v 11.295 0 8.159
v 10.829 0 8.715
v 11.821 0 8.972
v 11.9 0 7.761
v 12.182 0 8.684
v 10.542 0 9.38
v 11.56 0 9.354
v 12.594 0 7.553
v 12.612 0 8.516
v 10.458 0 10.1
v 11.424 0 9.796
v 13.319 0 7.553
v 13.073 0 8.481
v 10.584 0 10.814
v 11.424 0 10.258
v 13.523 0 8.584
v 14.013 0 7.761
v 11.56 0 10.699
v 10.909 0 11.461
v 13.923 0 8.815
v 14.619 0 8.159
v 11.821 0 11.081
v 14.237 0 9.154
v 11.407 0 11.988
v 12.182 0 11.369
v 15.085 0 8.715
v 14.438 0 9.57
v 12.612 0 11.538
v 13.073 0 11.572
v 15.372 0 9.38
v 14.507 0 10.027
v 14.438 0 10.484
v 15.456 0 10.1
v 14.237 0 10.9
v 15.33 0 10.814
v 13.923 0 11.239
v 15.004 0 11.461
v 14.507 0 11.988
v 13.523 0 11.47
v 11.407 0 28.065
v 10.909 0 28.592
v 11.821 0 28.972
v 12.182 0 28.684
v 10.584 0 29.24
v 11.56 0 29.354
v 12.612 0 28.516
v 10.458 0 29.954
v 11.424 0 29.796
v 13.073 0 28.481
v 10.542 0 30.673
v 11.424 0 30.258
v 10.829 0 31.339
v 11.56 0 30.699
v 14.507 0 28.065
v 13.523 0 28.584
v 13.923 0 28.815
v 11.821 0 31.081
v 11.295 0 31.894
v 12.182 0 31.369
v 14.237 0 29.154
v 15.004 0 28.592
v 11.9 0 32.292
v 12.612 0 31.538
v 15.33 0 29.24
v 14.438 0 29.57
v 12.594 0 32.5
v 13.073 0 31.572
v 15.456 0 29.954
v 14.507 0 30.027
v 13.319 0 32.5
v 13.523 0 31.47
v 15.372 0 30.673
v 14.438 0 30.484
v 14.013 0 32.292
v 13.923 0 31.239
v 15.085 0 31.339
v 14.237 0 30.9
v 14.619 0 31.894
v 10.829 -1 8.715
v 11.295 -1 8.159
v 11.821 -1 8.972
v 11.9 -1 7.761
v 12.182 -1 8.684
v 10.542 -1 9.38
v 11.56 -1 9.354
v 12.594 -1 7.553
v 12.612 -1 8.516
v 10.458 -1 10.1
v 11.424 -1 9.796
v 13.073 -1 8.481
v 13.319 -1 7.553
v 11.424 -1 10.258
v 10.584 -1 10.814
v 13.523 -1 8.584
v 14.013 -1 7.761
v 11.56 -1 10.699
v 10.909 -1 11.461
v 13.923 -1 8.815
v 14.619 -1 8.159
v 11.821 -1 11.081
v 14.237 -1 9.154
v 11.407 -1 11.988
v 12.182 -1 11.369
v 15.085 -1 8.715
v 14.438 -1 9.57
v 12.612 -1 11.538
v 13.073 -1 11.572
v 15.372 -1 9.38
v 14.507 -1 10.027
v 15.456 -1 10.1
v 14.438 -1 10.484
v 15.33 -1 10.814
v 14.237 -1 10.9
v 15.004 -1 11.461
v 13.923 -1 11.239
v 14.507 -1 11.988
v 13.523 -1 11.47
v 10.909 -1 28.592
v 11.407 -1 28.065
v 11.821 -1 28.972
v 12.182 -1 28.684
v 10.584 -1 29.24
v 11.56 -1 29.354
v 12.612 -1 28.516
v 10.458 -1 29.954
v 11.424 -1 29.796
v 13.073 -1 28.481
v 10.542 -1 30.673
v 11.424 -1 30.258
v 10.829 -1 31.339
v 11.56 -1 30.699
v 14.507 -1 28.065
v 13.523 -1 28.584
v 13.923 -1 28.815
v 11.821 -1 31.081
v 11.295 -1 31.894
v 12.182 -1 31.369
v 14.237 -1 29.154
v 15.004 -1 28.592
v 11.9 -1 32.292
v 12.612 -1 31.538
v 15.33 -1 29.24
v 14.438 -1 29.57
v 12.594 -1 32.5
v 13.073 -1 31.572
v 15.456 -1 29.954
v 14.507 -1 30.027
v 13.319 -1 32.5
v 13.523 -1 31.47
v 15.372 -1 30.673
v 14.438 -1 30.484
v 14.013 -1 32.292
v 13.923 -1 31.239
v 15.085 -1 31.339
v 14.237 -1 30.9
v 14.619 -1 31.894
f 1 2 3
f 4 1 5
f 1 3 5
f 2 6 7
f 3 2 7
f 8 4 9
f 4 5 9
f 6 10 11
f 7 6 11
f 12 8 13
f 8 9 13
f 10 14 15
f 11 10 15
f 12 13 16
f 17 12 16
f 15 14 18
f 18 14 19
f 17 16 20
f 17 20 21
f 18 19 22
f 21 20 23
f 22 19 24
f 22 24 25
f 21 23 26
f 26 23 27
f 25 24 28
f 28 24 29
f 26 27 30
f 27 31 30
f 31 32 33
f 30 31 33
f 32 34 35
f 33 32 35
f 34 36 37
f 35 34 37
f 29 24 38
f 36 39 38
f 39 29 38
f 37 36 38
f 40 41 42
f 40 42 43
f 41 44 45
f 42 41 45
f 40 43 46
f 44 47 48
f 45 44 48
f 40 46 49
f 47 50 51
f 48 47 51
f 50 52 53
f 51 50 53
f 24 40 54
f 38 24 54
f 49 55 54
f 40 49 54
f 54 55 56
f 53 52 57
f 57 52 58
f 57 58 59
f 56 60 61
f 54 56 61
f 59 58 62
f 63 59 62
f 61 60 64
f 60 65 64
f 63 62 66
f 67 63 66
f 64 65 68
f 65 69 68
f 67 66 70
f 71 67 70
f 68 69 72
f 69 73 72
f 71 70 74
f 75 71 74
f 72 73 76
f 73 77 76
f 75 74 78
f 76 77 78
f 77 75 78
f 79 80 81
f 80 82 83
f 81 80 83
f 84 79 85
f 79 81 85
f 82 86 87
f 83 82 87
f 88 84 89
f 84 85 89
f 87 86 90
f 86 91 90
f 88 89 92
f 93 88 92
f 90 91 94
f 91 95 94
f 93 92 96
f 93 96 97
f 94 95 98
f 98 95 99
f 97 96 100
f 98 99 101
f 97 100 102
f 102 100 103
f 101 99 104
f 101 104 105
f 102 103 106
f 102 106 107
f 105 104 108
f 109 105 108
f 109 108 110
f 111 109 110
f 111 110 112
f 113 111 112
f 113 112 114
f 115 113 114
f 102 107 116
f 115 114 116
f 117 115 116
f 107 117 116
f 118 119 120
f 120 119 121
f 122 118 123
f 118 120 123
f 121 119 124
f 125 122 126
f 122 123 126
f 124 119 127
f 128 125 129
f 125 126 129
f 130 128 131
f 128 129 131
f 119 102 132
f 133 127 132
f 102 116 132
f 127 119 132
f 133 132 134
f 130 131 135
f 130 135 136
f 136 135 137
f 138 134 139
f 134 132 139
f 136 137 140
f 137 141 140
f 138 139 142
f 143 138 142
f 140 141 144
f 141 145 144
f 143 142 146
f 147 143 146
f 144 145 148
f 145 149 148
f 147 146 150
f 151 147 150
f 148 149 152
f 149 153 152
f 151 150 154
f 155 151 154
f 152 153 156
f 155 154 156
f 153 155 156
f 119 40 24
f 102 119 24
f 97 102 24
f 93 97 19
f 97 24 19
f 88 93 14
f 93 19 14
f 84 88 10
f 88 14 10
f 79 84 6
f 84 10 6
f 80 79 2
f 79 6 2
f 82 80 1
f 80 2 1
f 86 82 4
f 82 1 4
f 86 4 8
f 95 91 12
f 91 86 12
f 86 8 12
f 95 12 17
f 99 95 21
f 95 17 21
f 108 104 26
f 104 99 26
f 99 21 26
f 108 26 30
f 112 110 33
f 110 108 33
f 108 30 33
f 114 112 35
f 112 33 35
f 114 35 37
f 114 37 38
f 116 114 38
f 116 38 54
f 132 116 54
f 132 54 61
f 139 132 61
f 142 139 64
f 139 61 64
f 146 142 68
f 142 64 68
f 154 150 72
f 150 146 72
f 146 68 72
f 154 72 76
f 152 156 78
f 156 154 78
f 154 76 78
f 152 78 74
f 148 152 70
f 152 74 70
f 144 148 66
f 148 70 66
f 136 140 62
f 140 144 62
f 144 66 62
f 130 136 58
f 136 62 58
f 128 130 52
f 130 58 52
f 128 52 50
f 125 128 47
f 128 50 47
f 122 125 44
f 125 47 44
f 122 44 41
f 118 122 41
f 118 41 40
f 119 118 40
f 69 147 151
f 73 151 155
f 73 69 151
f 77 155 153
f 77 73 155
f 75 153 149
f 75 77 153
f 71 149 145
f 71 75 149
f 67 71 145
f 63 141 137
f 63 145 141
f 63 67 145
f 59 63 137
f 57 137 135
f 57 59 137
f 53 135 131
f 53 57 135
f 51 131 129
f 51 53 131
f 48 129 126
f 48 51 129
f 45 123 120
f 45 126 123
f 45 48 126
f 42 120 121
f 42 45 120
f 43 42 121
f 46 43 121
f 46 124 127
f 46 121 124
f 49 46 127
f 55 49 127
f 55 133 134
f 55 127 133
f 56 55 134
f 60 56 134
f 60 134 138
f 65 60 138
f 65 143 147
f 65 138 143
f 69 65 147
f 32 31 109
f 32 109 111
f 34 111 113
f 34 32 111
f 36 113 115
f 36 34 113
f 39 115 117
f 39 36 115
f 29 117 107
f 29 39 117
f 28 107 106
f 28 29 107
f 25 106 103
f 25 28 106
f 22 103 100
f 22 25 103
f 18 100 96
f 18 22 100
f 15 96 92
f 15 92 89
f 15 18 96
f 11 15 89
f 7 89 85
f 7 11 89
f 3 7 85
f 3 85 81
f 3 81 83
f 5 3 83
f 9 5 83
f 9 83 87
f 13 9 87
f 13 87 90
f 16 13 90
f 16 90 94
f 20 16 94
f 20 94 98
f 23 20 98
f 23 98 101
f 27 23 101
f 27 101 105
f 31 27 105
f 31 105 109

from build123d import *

# Parameters (mm, degrees)
F0_R          = 1.55
F1_DEPTH      = 4.5
F2_W          = 2.5
F2_H          = 6.339147
F3_DEPTH      = 4.051
F3_DEPTH_BACK = 0.951
F4_W          = 15.761445
F4_H          = 34.727139
F4_R          = 1.55
F5_DEPTH      = 3.5


with BuildPart() as f1:
    # F0 (on Front) → F1 (new body)
    with BuildSketch(Plane.XZ):
        with BuildLine():
            Line((14.506739, 11.988214), (14.506739, 28.065205))
            ThreePointArc((14.506739, 28.065205), (12.956739, 32.52671), (11.406739, 28.065205))
            Line((11.406739, 28.065205), (11.406739, 11.988214))
            ThreePointArc((11.406739, 11.988214), (12.956739, 7.52671), (14.506739, 11.988214))
        make_face()
        with Locations((12.956739, 10.02671)):
            Circle(F0_R, mode=Mode.SUBTRACT)
        with Locations((12.956739, 30.02671)):
            Circle(F0_R, mode=Mode.SUBTRACT)
    extrude(amount=F1_DEPTH)

    # F2 (on face) → F3 (cut, two sides)
    with BuildSketch(Plane.YZ.offset(14.506739)) as f3_sk:
        with Locations((-2.25, 30.034779)):
            Rectangle(F2_W, F2_H)
    extrude(amount=-F3_DEPTH, mode=Mode.SUBTRACT)
    extrude(f3_sk.sketch, amount=-F3_DEPTH_BACK, mode=Mode.SUBTRACT)

    # F4 (on face) → F5 (cut)
    with BuildSketch(Plane.XZ.offset(4.5)):
        with Locations((14.291149, 18.705026)):
            Rectangle(F4_W, F4_H)
        with BuildLine():
            ThreePointArc((14.506739, 11.988214), (12.956739, 7.52671), (11.406739, 11.988214))
            Line((11.406739, 11.988214), (11.406739, 28.065205))
            ThreePointArc((11.406739, 28.065205), (12.956739, 32.52671), (14.506739, 28.065205))
            Line((14.506739, 28.065205), (14.506739, 11.988214))
        make_face(mode=Mode.SUBTRACT)
        with BuildLine():
            Line((11.406739, 28.065205), (11.406739, 11.988214))
            ThreePointArc((11.406739, 11.988214), (12.956739, 7.52671), (14.506739, 11.988214))
            Line((14.506739, 11.988214), (14.506739, 28.065205))
            ThreePointArc((14.506739, 28.065205), (12.956739, 32.52671), (11.406739, 28.065205))
        make_face()
        with Locations((12.956739, 10.02671)):
            Circle(F4_R, mode=Mode.SUBTRACT)
        with Locations((12.956739, 30.02671)):
            Circle(F4_R, mode=Mode.SUBTRACT)
    extrude(amount=-F5_DEPTH, mode=Mode.SUBTRACT)


solid = f1.part
